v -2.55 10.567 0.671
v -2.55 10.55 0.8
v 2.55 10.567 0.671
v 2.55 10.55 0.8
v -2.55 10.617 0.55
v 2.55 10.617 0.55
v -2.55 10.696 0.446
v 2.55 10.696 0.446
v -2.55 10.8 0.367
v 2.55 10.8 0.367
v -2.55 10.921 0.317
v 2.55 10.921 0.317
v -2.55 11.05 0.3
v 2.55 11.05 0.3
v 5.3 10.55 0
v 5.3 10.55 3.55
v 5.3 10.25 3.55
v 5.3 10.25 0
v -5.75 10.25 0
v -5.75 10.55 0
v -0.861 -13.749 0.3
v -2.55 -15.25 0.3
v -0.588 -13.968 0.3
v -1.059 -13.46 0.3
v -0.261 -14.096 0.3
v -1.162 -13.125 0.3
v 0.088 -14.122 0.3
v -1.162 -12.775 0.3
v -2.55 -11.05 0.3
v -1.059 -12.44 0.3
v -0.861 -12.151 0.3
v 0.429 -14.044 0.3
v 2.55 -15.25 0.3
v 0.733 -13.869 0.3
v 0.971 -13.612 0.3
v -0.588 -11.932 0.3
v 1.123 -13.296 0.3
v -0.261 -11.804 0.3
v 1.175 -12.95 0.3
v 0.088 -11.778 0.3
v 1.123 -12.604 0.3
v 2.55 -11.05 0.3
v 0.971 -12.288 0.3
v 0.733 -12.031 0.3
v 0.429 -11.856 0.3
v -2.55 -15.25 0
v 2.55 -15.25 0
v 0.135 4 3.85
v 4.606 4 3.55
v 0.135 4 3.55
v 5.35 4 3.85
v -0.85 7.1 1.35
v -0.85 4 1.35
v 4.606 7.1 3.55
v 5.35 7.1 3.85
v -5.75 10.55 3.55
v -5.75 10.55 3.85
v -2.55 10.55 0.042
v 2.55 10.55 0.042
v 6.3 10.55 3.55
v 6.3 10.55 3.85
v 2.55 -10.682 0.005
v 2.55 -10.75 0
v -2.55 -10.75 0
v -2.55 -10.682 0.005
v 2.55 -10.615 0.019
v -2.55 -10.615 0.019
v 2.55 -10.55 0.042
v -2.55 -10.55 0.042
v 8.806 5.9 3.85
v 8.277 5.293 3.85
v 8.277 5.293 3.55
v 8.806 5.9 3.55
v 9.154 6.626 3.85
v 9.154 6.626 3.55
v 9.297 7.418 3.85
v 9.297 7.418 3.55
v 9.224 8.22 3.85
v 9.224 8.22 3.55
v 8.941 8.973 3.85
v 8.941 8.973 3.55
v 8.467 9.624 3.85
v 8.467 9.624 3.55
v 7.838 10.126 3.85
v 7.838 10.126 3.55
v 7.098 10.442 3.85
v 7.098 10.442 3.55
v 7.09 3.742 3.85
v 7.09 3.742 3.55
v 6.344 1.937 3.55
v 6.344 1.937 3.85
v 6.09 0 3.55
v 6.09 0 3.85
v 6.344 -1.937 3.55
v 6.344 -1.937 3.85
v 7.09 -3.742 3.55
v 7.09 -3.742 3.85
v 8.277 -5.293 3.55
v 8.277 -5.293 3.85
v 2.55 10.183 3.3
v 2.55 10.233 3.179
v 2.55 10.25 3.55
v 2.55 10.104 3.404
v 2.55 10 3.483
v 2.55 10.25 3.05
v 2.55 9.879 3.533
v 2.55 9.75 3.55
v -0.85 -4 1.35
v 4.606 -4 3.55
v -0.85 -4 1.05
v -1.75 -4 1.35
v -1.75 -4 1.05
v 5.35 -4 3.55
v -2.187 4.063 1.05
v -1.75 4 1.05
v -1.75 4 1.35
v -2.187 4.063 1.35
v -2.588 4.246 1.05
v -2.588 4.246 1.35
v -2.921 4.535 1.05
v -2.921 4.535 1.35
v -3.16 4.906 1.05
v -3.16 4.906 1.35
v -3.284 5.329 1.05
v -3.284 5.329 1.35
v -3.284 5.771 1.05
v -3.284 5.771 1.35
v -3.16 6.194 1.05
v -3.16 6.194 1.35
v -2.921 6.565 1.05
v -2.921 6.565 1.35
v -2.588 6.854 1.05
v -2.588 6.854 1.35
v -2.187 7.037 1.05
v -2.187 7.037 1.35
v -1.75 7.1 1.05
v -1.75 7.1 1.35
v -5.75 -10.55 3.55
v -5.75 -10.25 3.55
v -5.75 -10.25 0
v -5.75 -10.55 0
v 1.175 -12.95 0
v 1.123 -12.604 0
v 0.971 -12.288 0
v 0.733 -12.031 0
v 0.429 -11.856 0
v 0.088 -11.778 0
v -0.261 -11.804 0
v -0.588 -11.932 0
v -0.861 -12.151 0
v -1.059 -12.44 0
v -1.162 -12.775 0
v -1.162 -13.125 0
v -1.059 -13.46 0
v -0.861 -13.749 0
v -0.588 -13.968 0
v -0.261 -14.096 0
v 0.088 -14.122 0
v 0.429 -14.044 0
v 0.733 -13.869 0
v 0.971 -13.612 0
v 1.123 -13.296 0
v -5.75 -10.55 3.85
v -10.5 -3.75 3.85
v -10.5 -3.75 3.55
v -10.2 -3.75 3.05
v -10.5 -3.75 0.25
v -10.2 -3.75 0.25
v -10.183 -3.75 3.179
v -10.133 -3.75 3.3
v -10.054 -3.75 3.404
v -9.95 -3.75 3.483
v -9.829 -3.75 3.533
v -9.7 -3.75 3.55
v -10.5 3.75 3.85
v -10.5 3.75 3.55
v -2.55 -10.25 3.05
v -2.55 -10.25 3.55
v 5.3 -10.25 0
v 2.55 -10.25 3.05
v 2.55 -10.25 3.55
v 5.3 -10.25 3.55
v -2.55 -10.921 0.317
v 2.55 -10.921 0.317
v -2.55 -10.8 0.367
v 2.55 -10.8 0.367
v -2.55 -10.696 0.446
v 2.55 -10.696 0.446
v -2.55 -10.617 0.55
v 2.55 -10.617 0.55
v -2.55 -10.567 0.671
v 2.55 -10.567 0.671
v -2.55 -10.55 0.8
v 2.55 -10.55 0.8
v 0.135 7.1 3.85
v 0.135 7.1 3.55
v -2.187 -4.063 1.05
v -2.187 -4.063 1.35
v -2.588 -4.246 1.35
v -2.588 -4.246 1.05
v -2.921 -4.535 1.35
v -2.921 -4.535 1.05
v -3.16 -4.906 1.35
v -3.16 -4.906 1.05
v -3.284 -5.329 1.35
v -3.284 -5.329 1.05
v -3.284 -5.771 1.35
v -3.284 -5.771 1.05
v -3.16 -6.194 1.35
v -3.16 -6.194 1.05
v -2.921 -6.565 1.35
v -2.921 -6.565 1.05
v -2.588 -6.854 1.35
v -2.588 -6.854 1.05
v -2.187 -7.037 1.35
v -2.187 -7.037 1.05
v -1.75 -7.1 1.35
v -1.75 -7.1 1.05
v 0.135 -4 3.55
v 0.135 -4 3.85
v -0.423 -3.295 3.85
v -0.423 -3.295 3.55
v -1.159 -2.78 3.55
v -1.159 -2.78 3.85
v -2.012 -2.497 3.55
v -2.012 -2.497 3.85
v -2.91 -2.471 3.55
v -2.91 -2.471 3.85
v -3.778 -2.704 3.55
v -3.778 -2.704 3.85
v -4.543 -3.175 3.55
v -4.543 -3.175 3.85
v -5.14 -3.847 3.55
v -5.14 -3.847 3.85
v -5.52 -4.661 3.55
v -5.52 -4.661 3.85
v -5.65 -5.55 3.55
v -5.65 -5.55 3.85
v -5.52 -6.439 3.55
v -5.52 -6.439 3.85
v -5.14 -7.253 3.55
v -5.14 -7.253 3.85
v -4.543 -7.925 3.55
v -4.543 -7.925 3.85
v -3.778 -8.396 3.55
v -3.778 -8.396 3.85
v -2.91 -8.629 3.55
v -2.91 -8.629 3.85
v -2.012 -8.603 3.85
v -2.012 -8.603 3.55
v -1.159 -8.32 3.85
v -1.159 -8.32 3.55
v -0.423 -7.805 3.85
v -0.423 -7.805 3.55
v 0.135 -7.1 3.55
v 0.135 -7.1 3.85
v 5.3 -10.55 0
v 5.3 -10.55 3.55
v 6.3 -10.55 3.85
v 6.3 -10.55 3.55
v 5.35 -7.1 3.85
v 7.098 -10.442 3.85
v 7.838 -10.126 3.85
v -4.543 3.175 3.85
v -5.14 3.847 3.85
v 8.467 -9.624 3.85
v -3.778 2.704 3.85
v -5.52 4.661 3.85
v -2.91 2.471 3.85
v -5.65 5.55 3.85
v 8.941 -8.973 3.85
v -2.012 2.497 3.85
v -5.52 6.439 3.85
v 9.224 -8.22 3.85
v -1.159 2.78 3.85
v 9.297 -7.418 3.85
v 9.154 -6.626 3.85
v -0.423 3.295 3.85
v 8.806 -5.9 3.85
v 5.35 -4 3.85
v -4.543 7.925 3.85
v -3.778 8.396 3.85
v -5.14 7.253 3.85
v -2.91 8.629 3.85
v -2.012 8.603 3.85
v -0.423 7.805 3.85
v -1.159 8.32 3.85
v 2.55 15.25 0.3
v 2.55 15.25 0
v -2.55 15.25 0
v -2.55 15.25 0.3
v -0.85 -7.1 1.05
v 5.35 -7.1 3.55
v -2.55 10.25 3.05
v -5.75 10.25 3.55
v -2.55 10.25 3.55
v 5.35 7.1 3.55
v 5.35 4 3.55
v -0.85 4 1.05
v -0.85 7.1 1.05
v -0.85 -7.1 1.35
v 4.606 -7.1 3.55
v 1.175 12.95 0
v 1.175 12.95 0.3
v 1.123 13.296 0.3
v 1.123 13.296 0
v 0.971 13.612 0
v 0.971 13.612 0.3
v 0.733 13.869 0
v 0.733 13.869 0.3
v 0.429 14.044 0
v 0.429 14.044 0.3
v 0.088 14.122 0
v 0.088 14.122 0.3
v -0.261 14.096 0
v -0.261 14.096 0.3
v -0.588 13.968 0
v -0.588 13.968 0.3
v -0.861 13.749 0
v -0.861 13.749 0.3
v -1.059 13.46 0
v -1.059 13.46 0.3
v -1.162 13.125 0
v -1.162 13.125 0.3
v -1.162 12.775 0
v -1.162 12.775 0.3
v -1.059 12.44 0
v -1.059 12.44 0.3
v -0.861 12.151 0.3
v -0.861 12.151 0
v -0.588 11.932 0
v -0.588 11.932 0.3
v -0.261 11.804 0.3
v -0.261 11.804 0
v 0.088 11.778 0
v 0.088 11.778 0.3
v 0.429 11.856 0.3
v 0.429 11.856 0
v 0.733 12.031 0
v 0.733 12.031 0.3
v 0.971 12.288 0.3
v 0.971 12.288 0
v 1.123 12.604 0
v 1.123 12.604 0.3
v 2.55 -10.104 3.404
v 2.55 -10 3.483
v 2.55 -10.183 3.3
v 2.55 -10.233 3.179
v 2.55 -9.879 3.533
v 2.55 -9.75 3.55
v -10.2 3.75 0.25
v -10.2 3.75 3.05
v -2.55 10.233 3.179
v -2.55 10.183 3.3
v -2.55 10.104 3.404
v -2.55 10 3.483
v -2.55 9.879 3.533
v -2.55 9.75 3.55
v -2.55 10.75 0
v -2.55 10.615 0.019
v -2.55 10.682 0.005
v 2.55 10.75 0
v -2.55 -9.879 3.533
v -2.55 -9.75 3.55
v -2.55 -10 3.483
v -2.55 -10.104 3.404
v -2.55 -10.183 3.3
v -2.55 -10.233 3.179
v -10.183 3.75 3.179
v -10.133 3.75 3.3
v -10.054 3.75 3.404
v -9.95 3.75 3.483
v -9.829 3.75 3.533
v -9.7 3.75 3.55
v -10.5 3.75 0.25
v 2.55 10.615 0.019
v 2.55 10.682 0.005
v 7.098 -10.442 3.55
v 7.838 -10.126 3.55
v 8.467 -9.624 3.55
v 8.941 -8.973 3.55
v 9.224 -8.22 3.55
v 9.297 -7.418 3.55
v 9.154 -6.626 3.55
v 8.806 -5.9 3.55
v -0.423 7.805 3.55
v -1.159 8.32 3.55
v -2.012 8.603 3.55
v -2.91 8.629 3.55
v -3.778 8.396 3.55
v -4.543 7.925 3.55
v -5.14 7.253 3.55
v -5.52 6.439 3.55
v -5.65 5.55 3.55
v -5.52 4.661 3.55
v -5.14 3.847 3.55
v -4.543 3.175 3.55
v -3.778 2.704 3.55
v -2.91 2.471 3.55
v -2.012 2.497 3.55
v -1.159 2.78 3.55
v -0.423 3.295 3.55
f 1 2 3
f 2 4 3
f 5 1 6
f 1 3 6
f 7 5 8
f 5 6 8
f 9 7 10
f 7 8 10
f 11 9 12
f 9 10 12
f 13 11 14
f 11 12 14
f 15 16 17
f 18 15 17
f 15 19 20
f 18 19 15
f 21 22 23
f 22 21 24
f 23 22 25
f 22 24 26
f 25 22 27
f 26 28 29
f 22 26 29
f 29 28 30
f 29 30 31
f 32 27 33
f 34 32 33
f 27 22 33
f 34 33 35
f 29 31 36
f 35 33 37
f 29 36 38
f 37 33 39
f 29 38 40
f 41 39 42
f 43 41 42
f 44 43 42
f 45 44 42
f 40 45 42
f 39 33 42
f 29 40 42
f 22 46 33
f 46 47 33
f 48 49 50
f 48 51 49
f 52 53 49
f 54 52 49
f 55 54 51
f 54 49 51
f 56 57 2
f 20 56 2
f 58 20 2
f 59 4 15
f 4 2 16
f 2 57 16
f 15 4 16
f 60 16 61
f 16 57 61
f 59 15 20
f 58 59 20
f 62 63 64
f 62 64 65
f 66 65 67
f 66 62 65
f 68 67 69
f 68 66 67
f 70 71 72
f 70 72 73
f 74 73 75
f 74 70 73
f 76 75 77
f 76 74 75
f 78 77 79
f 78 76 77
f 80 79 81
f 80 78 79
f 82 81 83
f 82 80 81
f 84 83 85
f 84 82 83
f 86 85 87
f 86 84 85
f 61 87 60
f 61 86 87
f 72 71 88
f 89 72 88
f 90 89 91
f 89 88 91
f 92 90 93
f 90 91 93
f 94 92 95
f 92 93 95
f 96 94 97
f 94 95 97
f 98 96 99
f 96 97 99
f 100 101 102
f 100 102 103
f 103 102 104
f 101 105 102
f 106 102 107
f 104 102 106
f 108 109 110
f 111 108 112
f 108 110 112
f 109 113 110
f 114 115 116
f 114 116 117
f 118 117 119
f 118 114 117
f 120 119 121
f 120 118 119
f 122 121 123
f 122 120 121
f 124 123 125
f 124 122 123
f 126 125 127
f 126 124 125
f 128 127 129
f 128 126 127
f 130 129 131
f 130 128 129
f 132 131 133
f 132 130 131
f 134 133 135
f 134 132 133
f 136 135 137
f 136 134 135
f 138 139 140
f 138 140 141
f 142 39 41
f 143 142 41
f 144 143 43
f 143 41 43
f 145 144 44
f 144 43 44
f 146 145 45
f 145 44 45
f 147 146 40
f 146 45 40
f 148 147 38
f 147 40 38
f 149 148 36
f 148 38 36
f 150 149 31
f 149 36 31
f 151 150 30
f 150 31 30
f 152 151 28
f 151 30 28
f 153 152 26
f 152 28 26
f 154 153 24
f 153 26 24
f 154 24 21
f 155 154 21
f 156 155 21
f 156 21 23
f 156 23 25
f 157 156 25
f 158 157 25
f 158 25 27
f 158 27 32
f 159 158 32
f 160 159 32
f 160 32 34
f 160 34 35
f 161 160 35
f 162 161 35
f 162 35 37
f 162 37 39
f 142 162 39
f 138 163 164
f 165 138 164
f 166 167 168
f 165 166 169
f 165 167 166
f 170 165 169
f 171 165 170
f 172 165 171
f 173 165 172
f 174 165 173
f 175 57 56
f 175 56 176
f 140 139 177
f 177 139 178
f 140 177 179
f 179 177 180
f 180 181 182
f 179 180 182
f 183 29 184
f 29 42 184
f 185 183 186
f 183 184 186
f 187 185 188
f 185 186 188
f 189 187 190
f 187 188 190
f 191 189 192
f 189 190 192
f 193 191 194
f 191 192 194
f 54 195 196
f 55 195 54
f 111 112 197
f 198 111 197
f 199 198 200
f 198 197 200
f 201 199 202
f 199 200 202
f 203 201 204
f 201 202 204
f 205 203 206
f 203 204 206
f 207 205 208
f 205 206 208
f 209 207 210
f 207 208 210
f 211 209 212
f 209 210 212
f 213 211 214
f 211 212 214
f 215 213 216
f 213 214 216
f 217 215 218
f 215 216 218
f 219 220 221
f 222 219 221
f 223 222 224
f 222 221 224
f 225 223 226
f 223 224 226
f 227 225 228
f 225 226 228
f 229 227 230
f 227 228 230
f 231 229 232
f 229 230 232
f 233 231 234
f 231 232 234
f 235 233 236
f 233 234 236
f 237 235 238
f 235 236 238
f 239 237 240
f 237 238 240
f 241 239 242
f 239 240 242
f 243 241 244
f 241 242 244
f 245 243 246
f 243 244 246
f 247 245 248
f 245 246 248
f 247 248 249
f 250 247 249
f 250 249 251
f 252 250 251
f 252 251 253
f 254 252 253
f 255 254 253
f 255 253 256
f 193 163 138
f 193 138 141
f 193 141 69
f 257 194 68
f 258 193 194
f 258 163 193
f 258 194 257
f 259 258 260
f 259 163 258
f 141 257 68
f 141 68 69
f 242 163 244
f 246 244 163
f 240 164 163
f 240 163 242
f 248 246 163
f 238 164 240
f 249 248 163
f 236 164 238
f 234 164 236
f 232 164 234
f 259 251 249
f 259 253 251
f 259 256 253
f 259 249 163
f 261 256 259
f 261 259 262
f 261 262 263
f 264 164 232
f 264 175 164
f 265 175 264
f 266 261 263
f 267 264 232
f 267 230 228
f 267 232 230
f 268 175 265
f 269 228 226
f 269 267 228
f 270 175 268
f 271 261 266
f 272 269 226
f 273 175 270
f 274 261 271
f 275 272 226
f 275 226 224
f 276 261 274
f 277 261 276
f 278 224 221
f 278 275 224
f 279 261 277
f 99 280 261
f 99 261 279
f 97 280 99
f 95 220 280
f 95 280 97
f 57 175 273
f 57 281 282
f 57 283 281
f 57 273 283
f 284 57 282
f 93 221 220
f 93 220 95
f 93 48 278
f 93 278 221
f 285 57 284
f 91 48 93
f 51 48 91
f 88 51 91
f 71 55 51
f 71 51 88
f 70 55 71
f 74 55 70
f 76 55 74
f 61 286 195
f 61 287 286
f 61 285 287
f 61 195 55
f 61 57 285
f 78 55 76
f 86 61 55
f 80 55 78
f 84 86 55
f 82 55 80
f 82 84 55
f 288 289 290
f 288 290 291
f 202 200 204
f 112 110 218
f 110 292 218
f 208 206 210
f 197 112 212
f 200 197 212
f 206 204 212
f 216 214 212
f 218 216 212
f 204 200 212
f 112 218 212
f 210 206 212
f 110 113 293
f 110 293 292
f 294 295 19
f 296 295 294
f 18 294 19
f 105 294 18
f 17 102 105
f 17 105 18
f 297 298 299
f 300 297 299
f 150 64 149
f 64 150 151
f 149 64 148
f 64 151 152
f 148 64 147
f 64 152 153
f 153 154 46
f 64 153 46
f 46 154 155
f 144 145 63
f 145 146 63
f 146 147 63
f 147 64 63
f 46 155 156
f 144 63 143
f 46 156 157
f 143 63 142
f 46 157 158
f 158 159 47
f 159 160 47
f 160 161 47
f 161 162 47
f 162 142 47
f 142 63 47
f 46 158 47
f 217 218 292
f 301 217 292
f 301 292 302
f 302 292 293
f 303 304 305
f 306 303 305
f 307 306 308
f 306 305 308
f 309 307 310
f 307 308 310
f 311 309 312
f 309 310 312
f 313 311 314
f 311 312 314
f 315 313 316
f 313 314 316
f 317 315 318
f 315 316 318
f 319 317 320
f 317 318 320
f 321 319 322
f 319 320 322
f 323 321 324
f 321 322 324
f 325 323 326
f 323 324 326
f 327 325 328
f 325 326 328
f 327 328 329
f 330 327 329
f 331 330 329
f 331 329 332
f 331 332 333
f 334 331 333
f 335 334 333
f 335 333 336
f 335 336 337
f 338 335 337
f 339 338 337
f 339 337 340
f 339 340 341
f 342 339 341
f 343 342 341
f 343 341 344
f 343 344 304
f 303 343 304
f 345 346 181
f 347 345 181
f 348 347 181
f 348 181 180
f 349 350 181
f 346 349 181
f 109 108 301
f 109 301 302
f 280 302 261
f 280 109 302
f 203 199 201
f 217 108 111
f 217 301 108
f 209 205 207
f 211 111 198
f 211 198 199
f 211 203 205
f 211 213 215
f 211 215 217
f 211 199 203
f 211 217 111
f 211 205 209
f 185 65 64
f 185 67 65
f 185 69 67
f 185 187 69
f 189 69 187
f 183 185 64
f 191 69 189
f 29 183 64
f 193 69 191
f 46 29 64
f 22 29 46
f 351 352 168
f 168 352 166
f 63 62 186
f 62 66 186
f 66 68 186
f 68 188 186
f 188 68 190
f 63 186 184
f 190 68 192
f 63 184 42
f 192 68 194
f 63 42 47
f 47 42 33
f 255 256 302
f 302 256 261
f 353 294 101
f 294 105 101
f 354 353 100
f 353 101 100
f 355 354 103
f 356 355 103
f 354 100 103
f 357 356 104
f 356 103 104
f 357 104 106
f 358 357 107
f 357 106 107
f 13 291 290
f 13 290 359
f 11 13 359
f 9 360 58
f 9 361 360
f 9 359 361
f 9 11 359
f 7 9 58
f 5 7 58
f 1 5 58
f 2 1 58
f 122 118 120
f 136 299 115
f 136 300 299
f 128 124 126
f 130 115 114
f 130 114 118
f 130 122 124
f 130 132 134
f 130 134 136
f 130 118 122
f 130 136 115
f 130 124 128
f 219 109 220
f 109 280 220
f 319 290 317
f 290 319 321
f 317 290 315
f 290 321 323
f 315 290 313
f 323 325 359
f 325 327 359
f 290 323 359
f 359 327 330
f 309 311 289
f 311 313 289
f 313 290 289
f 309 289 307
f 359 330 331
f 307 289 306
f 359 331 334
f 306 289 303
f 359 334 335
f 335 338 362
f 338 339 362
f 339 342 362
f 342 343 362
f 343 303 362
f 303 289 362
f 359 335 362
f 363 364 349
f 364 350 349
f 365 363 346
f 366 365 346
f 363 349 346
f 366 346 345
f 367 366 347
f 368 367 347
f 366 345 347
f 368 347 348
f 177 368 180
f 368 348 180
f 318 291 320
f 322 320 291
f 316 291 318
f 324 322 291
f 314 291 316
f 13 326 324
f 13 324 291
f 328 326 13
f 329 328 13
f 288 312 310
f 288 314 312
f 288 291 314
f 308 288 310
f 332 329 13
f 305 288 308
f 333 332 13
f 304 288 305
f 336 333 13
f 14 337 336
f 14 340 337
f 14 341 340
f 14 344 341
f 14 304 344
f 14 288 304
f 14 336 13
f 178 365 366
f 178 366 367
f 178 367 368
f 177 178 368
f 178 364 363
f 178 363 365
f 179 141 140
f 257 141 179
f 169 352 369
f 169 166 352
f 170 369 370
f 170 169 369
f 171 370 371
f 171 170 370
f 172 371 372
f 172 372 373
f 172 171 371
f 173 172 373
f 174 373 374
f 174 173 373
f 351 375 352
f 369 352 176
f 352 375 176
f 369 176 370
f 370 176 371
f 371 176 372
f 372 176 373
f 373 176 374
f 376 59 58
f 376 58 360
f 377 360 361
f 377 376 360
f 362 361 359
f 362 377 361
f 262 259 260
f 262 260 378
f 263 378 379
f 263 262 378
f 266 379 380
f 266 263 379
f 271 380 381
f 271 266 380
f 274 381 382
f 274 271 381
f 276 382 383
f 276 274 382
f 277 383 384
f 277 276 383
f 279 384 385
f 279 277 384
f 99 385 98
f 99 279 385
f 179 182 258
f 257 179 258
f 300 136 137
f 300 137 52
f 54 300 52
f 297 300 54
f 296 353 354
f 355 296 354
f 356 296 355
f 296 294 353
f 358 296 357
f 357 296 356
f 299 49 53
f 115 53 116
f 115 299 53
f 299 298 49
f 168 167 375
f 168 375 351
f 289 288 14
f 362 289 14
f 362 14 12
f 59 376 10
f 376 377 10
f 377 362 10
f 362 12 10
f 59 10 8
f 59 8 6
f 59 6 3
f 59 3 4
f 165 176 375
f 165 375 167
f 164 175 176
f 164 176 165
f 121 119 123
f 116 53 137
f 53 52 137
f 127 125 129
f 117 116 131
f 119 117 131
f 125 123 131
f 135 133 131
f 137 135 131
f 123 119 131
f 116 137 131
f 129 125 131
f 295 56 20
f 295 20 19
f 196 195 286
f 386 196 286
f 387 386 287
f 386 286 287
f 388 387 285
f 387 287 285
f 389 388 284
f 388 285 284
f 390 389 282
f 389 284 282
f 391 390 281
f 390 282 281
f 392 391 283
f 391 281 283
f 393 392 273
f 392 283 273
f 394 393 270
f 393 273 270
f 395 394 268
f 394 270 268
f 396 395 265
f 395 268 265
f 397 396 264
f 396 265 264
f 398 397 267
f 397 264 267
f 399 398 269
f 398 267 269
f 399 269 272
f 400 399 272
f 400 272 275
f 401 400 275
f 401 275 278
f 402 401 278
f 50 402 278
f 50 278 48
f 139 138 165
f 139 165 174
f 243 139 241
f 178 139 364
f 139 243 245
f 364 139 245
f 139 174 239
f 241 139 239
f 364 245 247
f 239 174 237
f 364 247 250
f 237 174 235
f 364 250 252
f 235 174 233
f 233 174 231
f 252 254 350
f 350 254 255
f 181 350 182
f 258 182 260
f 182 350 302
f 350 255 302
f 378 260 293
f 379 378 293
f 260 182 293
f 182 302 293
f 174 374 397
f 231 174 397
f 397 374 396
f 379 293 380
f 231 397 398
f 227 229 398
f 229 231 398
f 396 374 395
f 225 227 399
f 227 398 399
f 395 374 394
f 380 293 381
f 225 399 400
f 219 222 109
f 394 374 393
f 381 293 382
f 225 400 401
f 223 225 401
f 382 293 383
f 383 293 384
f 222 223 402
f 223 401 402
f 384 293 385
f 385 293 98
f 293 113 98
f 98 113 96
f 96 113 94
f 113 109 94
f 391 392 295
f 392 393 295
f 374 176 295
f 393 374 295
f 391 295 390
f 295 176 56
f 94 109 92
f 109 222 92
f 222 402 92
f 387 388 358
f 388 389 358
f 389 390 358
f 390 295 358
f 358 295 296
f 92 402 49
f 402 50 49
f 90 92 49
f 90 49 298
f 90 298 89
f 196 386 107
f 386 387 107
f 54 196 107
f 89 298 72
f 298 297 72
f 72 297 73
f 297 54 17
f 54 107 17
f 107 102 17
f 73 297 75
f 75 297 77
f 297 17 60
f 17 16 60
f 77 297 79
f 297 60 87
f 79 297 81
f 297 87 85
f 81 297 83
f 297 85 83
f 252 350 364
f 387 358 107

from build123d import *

# Parameters (mm, degrees)
PAD001_DEPTH    = 2.55
SKETCH_R        = 1.175
POCKET_DEPTH    = 0.301
PAD_DEPTH       = 0.3
POCKET001_DEPTH = 3.851
SKETCH004_W     = 0.3
SKETCH004_H     = 7.5
PAD002_DEPTH    = 3.3
FILLET_R        = 0.5
SKETCH005_W     = 11.05
SKETCH005_H     = 0.3
PAD003_DEPTH    = 3.55
PAD004_DEPTH    = 3.1
PAD005_DEPTH    = 0.3


with BuildPart() as part:
    # Sketch001 (on YZ_Plane of Origin) → Pad001 (new body, symmetric)
    with BuildSketch(Plane.YZ):
        with BuildLine():
            Line((15.25, 0), (10.75, 0))
            ThreePointArc((10.25, 0.5), (10.396447, 0.146447), (10.75, 0))
            Line((10.25, 0.5), (10.25, 3.05))
            ThreePointArc((10.25, 3.05), (10.103553, 3.403553), (9.75, 3.55))
            Line((9.75, 3.55), (-9.75, 3.55))
            ThreePointArc((-9.75, 3.55), (-10.103553, 3.403553), (-10.25, 3.05))
            Line((-10.25, 3.05), (-10.25, 0.5))
            ThreePointArc((-10.75, 0), (-10.396447, 0.146447), (-10.25, 0.5))
            Line((-10.75, 0), (-15.25, 0))
            Line((-15.25, 0), (-15.25, 0.3))
            Line((-15.25, 0.3), (-11.05, 0.3))
            ThreePointArc((-11.05, 0.3), (-10.696447, 0.446447), (-10.55, 0.8))
            Line((-10.55, 0.8), (-10.55, 3.85))
            Line((10.55, 3.85), (-10.55, 3.85))
            Line((10.55, 0.8), (10.55, 3.85))
            ThreePointArc((10.55, 0.8), (10.696447, 0.446447), (11.05, 0.3))
            Line((15.25, 0.3), (11.05, 0.3))
            Line((15.25, 0), (15.25, 0.3))
        make_face()
    extrude(amount=PAD001_DEPTH, both=True)

    # Sketch (on Face18 of Pad001) → Pocket (cut, through all)
    with BuildSketch(Plane.XY.offset(0.3)):
        with Locations((0, 12.95)):
            Circle(SKETCH_R)
        with Locations((0, -12.95)):
            Circle(SKETCH_R)
    extrude(amount=-POCKET_DEPTH, mode=Mode.SUBTRACT)

    # Sketch002 → Pad (join)
    with BuildSketch(Plane.XY.offset(3.85)):
        with BuildLine():
            Line((-5.75, 10.55), (-10.5, 3.75))
            Line((-10.5, 3.75), (-10.5, -3.75))
            Line((-5.75, -10.55), (-10.5, -3.75))
            Line((-5.75, -10.55), (6.3, -10.55))
            ThreePointArc((6.3, -10.55), (9.107984, -8.606042), (8.2769, -5.293484))
            ThreePointArc((8.2769, 5.293484), (6.09, 0), (8.2769, -5.293484))
            ThreePointArc((8.2769, 5.293484), (9.107984, 8.606042), (6.3, 10.55))
            Line((-5.75, 10.55), (6.3, 10.55))
        make_face()
    extrude(amount=-PAD_DEPTH)

    # Sketch003 (on Face30 of Pad) → Pocket001 (cut, through all)
    with BuildSketch(Plane.XY.offset(3.85)):
        with BuildLine():
            ThreePointArc((0.134679, 7.1), (-5.65, 5.55), (0.134679, 4))
            Line((5.35, 4), (0.134679, 4))
            Line((5.35, 7.1), (5.35, 4))
            Line((0.134679, 7.1), (5.35, 7.1))
        make_face()
        with BuildLine():
            ThreePointArc((0.134679, -4), (-5.65, -5.55), (0.134679, -7.1))
            Line((0.134679, -7.1), (5.35, -7.1))
            Line((5.35, -7.1), (5.35, -4))
            Line((5.35, -4), (0.134679, -4))
        make_face()
    extrude(amount=-POCKET001_DEPTH, mode=Mode.SUBTRACT)

    # Sketch004 (on Face11 of Pocket001) → Pad002 (join)
    with BuildSketch(Plane(origin=(0, 0, 3.55), x_dir=(1, 0, 0), z_dir=(0, 0, -1))):
        with Locations((-10.35, 0)):
            Rectangle(SKETCH004_W, SKETCH004_H)
    extrude(amount=PAD002_DEPTH)

    # Fillet
    fillet_edges = [part.edges().sort_by_distance(p)[0] for p in [
        (-10.2, 0, 3.55),
    ]]
    fillet(fillet_edges, radius=FILLET_R)

    # Sketch005 (on Face11 of Pocket001) → Pad003 (join)
    with BuildSketch(Plane(origin=(0, 0, 3.55), x_dir=(1, 0, 0), z_dir=(0, 0, -1))):
        with Locations((-0.225, 10.4)):
            Rectangle(SKETCH005_W, SKETCH005_H)
        with Locations((-0.225, -10.4)):
            Rectangle(SKETCH005_W, SKETCH005_H)
    extrude(amount=PAD003_DEPTH)

    # Sketch006 (on XZ_Plane of Origin) → Pad004 (join)
    with BuildSketch(Plane.XZ.offset(4)):
        Polygon((-0.85, 1.35), (5.35, 3.85), (5.35, 3.55), (-0.85, 1.05), align=None)
    pad004 = extrude(amount=PAD004_DEPTH)

    # Mirrored: Pad004 across XZ
    add(pad004.mirror(Plane.XZ))

    # Sketch007 (on XY_Plane of Origin) → Pad005 (join)
    with BuildSketch(Plane.XY.offset(1.05)):
        with BuildLine():
            Line((-0.85, 4), (-1.75, 4))
            ThreePointArc((-1.75, 4), (-3.3, 5.55), (-1.75, 7.1))
            Line((-1.75, 7.1), (-0.85, 7.1))
            Line((-0.85, 7.1), (-0.85, 4))
        make_face()
    pad005 = extrude(amount=PAD005_DEPTH)

    # Mirrored001: Pad005 across Sketch007 H_Axis
    add(pad005.mirror(Plane(origin=(0, 0, 1.05), x_dir=(0, 0, 1), z_dir=(0, 1, 0))))


solid = part.part
